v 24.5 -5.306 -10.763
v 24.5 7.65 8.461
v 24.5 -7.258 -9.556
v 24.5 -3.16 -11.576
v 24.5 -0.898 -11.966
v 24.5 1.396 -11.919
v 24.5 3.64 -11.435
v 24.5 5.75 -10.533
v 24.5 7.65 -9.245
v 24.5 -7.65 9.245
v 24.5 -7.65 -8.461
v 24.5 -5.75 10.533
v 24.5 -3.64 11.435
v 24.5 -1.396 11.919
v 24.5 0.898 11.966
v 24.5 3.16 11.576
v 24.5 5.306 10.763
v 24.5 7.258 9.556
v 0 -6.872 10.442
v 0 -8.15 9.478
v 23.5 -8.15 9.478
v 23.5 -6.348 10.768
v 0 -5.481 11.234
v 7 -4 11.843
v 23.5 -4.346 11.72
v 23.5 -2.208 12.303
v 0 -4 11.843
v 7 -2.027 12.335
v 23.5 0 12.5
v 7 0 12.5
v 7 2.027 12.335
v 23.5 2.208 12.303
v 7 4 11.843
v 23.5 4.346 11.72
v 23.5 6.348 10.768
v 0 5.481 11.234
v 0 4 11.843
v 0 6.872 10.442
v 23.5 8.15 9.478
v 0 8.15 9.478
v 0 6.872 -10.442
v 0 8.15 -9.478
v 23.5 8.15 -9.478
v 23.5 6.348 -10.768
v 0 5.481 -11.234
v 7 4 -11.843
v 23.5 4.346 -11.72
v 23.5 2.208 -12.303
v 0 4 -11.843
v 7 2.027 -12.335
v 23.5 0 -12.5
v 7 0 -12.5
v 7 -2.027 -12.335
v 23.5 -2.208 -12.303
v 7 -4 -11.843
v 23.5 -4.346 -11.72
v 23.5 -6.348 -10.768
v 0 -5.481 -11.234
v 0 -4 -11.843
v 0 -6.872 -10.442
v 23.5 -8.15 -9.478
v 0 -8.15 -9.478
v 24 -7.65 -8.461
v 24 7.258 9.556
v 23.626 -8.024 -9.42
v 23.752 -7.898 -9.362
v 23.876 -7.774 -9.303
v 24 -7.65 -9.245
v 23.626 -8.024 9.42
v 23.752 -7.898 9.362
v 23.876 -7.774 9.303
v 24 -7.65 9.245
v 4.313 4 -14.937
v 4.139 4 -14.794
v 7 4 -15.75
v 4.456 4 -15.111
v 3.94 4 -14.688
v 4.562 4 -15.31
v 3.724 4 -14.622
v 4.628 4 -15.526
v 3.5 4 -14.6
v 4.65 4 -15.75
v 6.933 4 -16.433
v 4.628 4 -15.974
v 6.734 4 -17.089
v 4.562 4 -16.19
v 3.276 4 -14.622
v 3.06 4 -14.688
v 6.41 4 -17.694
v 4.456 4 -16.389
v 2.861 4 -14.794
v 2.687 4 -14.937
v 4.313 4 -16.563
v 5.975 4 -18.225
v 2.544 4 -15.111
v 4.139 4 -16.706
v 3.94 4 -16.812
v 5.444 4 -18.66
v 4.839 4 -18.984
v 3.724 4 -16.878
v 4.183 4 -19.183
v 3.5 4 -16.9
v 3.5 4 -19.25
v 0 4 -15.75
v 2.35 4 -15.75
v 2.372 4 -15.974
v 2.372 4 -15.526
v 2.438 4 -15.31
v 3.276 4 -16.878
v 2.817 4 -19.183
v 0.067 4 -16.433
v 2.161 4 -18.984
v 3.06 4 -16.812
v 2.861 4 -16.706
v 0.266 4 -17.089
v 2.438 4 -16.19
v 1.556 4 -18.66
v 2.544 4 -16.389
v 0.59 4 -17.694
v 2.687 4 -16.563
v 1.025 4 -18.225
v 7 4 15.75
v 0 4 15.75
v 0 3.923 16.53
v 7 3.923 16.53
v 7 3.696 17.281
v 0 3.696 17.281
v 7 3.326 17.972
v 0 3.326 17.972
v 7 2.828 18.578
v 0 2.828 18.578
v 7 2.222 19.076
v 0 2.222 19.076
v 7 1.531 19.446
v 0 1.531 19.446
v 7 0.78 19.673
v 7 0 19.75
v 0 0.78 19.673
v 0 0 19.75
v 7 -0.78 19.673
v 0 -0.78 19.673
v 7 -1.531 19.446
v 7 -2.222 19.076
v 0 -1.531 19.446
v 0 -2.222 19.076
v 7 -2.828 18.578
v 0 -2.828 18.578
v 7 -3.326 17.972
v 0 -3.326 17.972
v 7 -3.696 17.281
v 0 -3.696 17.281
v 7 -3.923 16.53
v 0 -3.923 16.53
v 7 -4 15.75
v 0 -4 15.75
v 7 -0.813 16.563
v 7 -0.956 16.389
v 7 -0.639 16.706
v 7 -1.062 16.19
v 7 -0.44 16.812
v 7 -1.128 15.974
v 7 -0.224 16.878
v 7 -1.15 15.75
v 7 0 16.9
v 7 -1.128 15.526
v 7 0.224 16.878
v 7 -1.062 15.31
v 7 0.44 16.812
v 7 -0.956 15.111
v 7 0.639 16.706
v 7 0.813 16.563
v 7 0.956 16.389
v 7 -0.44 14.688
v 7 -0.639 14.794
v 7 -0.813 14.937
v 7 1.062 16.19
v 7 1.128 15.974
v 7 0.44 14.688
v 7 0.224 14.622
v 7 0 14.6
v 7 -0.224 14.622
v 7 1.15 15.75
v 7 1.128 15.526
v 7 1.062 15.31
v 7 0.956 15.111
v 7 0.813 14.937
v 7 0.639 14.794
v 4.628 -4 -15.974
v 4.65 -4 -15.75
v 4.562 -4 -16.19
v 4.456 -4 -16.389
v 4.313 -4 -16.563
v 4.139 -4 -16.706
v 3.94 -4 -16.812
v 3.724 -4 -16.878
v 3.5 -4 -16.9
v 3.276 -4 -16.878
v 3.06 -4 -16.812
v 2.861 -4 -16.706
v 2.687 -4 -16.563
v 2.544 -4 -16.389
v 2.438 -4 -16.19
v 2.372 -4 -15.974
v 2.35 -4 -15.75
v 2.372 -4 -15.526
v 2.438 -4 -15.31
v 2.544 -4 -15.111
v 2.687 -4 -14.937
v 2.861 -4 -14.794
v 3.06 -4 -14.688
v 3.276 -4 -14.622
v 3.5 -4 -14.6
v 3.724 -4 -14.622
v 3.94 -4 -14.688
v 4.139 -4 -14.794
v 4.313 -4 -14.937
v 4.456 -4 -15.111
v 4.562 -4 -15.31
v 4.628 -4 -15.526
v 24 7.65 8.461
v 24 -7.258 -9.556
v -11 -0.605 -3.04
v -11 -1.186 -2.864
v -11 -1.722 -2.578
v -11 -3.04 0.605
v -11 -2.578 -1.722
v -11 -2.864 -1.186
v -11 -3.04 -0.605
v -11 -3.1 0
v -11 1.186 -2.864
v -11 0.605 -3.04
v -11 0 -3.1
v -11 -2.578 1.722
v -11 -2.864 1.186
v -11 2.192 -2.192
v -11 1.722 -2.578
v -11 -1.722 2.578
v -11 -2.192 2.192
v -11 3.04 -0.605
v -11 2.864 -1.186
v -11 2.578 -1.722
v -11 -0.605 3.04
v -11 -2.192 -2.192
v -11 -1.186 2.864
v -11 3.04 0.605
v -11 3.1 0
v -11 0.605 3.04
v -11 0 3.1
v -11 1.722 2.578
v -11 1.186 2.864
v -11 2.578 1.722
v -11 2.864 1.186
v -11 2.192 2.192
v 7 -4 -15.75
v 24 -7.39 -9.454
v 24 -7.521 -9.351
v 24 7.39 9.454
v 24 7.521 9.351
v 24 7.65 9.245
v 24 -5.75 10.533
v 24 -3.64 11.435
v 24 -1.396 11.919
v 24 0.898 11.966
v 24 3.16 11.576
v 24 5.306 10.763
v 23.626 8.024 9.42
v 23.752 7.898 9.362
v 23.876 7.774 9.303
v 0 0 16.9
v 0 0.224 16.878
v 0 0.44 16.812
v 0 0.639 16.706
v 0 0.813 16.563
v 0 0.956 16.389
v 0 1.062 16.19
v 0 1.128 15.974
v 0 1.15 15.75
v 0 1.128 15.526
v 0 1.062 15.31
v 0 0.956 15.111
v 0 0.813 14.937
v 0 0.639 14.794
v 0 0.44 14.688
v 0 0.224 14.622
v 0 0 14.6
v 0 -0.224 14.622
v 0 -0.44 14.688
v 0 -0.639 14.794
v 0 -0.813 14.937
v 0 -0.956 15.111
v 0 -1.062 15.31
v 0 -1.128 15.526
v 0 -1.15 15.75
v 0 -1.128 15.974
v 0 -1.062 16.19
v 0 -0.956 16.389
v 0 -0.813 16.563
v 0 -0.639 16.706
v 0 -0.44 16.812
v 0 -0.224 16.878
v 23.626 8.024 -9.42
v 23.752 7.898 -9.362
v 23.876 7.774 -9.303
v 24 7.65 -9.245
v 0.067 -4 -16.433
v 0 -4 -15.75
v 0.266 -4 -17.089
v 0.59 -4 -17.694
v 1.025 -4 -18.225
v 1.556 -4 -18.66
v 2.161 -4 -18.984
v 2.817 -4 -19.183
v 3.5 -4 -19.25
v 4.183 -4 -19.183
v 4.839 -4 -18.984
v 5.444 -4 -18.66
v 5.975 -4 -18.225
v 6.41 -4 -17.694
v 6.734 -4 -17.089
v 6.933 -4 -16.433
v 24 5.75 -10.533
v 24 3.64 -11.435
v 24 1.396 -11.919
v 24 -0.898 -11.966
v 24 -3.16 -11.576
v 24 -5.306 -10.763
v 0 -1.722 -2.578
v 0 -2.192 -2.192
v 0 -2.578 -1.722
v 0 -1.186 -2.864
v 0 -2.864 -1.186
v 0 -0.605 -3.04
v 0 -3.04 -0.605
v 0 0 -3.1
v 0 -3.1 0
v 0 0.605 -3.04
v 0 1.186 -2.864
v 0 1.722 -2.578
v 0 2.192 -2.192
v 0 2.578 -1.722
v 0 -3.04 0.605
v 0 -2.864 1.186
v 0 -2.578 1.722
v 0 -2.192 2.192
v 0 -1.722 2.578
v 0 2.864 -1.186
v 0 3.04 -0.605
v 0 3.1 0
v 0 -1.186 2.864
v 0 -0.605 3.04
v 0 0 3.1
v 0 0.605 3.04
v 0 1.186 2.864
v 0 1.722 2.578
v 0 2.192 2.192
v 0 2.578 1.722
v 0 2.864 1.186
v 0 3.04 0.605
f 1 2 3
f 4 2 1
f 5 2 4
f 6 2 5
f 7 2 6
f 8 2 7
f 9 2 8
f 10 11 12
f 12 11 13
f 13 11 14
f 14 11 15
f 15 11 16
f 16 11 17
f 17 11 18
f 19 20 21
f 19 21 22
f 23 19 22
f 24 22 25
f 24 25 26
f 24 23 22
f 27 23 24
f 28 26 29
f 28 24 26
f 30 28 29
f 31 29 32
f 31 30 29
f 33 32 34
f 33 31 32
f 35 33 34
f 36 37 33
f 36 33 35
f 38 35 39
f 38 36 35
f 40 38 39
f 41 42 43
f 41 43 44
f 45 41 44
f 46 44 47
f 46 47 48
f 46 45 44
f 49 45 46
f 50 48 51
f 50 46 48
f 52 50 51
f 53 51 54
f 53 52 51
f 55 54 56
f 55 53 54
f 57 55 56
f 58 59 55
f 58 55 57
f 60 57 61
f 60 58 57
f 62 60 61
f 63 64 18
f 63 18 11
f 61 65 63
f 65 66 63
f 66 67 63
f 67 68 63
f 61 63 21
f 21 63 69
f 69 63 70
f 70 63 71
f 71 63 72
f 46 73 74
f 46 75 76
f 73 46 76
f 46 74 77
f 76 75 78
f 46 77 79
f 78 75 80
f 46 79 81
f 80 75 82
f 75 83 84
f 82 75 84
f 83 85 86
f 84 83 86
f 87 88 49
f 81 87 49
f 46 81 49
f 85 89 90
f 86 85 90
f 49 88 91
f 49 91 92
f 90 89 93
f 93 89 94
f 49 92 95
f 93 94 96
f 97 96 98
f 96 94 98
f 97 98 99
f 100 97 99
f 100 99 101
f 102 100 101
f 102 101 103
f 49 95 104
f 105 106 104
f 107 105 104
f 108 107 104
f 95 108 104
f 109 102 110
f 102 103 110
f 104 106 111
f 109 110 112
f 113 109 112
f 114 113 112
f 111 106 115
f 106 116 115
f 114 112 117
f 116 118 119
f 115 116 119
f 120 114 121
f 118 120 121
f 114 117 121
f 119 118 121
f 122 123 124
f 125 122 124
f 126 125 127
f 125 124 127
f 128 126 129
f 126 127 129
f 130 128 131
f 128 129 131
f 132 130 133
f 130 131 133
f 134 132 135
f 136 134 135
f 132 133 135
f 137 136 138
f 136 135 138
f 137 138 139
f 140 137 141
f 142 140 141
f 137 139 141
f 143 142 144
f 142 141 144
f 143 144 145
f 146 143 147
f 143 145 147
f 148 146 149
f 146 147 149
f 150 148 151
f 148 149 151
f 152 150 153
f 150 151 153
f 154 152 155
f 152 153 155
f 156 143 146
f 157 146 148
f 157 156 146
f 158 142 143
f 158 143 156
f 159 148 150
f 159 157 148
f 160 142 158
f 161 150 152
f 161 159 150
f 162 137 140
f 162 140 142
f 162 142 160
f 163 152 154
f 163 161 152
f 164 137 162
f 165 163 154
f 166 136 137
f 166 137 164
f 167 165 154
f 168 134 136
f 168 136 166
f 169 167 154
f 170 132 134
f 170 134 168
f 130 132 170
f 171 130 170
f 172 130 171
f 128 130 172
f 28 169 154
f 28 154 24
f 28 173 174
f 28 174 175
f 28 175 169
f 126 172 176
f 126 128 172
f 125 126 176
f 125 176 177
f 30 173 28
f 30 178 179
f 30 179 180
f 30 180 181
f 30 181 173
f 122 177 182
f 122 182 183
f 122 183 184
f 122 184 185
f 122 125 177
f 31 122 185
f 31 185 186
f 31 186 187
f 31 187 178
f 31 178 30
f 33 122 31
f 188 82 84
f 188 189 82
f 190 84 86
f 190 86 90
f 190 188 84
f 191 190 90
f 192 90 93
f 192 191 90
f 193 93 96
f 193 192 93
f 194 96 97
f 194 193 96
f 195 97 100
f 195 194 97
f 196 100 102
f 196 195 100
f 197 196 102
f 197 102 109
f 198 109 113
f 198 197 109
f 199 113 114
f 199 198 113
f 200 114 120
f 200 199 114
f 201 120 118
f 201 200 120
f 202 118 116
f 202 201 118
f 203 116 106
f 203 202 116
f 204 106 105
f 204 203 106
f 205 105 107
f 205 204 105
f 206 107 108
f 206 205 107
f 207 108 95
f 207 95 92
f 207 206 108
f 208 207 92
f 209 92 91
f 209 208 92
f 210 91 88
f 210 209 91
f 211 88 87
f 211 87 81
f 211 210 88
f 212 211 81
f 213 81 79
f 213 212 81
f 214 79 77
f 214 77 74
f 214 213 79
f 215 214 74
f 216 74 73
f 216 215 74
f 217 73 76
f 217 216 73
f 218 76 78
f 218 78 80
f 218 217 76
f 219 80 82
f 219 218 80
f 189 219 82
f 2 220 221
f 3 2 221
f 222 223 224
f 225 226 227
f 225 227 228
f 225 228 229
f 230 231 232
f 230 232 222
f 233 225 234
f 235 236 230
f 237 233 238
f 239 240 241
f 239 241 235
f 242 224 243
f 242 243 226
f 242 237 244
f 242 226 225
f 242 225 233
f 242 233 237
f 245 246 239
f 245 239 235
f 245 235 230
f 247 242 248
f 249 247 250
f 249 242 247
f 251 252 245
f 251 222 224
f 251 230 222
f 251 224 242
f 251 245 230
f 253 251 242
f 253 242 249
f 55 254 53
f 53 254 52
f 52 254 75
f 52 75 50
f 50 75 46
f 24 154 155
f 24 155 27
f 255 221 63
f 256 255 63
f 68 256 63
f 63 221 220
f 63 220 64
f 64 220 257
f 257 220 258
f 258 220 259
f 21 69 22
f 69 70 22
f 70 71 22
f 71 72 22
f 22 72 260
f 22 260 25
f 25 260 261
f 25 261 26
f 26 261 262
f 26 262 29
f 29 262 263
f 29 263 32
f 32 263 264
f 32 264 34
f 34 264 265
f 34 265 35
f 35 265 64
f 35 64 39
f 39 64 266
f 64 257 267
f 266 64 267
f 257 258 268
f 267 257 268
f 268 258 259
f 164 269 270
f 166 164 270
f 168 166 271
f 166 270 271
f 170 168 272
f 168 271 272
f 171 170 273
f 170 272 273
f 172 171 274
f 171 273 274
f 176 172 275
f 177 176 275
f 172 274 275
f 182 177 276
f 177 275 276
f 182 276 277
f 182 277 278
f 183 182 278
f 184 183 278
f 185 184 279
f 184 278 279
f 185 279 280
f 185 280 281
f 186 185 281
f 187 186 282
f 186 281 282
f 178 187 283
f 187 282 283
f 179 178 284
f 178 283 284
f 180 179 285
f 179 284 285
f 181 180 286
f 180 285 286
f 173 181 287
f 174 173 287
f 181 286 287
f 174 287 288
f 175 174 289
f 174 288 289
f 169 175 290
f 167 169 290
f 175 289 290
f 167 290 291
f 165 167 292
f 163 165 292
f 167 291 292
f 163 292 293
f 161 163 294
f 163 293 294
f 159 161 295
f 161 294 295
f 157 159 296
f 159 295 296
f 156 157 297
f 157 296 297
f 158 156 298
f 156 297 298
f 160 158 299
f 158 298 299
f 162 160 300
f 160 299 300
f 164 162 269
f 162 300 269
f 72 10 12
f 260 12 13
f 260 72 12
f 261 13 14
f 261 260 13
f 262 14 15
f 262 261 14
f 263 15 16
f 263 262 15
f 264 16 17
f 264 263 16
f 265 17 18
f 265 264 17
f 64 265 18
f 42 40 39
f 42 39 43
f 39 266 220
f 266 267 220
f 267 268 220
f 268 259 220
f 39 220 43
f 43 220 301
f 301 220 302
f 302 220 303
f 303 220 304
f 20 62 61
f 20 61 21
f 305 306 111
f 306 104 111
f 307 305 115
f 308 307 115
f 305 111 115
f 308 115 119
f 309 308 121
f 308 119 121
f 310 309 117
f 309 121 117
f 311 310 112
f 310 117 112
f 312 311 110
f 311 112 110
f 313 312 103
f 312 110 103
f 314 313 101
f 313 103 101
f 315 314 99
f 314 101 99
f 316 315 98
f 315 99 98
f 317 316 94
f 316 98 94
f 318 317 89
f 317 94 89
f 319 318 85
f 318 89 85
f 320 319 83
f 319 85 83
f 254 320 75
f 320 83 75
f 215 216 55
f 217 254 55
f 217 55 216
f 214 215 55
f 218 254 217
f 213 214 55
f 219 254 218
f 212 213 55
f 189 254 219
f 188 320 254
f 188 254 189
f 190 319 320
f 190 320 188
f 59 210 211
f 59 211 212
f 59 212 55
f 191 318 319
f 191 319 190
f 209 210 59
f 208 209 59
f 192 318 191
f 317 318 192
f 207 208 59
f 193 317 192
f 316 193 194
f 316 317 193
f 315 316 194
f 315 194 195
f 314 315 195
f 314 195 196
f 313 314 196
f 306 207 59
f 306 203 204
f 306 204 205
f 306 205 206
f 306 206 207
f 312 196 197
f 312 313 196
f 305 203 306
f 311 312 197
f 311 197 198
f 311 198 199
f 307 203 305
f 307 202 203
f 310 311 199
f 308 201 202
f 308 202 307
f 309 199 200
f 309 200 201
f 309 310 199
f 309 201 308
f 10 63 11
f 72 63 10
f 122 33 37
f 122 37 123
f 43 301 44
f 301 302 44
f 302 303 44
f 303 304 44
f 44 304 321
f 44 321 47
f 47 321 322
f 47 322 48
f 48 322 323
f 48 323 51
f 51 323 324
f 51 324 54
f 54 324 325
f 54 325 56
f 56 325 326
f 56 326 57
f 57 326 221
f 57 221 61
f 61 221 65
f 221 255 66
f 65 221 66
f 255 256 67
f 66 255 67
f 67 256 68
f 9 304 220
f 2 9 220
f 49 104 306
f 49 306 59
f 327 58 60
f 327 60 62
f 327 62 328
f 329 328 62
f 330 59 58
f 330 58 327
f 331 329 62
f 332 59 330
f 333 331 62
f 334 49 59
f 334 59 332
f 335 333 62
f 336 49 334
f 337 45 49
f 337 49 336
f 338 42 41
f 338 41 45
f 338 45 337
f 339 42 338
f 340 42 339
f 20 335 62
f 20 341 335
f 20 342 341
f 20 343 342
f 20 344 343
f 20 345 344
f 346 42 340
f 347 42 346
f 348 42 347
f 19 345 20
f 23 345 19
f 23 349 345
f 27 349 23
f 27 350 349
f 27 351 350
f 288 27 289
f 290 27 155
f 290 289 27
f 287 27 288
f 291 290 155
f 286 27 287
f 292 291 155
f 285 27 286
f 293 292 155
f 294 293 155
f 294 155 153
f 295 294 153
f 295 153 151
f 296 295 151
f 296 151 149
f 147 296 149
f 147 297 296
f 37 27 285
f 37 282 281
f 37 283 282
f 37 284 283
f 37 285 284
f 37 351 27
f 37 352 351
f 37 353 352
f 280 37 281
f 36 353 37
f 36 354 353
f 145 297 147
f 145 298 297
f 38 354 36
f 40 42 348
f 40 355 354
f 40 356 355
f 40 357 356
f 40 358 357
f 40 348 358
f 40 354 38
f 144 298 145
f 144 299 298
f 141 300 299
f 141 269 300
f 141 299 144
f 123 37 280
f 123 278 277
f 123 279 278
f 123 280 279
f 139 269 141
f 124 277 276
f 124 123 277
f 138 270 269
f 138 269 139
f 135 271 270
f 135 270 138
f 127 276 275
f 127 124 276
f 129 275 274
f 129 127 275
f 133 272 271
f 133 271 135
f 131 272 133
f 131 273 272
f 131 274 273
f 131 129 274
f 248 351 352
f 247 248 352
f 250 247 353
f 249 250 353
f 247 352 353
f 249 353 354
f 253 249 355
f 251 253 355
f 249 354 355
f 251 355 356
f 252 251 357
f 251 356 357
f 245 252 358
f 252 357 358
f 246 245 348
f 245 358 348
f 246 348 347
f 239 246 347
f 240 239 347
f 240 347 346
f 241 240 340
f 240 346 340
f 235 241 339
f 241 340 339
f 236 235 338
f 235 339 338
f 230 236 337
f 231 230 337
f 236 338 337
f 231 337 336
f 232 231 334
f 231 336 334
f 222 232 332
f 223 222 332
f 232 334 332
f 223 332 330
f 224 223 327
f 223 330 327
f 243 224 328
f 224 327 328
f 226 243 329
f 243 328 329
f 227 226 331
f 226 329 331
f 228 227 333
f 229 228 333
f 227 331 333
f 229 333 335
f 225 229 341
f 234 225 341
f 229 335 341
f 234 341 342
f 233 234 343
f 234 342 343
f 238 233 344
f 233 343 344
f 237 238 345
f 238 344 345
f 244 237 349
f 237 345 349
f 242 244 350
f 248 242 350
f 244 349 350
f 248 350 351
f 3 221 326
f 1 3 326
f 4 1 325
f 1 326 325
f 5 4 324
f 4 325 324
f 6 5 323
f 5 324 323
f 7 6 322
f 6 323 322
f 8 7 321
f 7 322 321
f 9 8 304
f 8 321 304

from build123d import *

# Parameters (mm, degrees)
EXTRUDE_1_DEPTH = 24
SKETCH_2_R      = 1.15
EXTRUDE_2_DEPTH = 7
SKETCH_3_R      = 1.15
EXTRUDE_3_DEPTH = 4
SKETCH_4_R      = 3.1
EXTRUDE_4_DEPTH = 11
CHAMFER_4_SIZE  = 0.5
EXTRUDE_5_DEPTH = 0.5


with BuildPart() as part:
    # 草图1 → 凸台-拉伸1 (new body)
    with BuildSketch(Plane(origin=(0, 0, 0), x_dir=(0, 0, -1), z_dir=(1, 0, 0))):
        with BuildLine():
            Line((9.477737072, -8.15), (-9.477737072, -8.15))
            ThreePointArc((-9.477737072, -8.15), (-12.5, 0), (-9.477737072, 8.15))
            Line((-9.477737072, 8.15), (9.477737072, 8.15))
            ThreePointArc((9.477737072, 8.15), (12.5, 0), (9.477737072, -8.15))
        make_face()
    extrude(amount=EXTRUDE_1_DEPTH)

    # 草图2 → 凸台-拉伸2 (add)
    with BuildSketch(Plane.ZY):
        with BuildLine():
            Line((0, 4), (15.75, 4))
            ThreePointArc((15.75, 4), (19.75, 0), (15.75, -4))
            Line((15.75, -4), (0, -4))
            ThreePointArc((0, -4), (-4, 0), (0, 4))
        make_face()
        with Locations((15.75, 0)):
            Circle(SKETCH_2_R, mode=Mode.SUBTRACT)
    extrude(amount=-EXTRUDE_2_DEPTH)

    # 草图3 → 凸台-拉伸3 (add, symmetric)
    with BuildSketch(Plane(origin=(0, 0, 0), x_dir=(1, 0, 0), z_dir=(0, 1, 0))):
        with BuildLine():
            Line((0, 0), (0, 15.75))
            ThreePointArc((0, 15.75), (3.5, 19.25), (7, 15.75))
            Line((7, 15.75), (7, 0))
            ThreePointArc((7, 0), (3.5, -3.5), (0, 0))
        make_face()
        with Locations((3.5, 15.75)):
            Circle(SKETCH_3_R, mode=Mode.SUBTRACT)
    extrude(amount=EXTRUDE_3_DEPTH, both=True)

    # 草图4 → 凸台-拉伸4 (add)
    with BuildSketch(Plane.ZY):
        Circle(SKETCH_4_R)
    extrude(amount=EXTRUDE_4_DEPTH)

    # 倒角4
    chamfer_4_edges = [part.edges().sort_by_distance(p)[0] for p in [
        (24, 0, -12.5),
        (24, 8.15, 0),
        (24, 0, 12.5),
        (24, -8.15, 0),
    ]]
    chamfer(chamfer_4_edges, length=CHAMFER_4_SIZE)

    # 草图5 → 凸台-拉伸5 (add)
    with BuildSketch(Plane(origin=(24, 0, 0), x_dir=(0, 0, -1), z_dir=(1, 0, 0))):
        with BuildLine():
            Line((-9.556125253, 7.258131313), (8.461090538, -7.65))
            Line((8.461090538, -7.65), (-9.245404264, -7.65))
            ThreePointArc((-9.245404264, -7.65), (-11.997394419, -0.250054295), (-9.556125253, 7.258131313))
        make_face()
        with BuildLine():
            Line((9.245404264, 7.65), (-8.461090538, 7.65))
            Line((-8.461090538, 7.65), (9.556125253, -7.258131313))
            ThreePointArc((9.556125253, -7.258131313), (11.997394419, 0.250054295), (9.245404264, 7.65))
        make_face()
    extrude(amount=EXTRUDE_5_DEPTH)


solid = part.part
